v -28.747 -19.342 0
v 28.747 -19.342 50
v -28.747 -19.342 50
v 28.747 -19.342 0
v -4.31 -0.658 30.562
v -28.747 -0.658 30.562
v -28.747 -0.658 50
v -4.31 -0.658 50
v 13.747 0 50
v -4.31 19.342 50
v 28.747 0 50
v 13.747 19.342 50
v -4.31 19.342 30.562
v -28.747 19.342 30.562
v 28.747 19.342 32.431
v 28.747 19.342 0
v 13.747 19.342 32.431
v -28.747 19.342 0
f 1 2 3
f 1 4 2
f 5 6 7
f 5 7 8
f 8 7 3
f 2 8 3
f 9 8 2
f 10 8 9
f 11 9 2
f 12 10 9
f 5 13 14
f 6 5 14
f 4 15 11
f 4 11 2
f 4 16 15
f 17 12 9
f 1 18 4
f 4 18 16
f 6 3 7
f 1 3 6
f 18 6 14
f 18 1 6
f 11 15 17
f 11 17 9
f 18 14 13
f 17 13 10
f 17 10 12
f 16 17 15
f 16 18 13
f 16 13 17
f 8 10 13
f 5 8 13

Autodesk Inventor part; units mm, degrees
ref_plane "YZ Plane" through (0, 0, 0) normal (1, 0, 0) x (0, 1, 0)
ref_plane "XZ Plane" through (0, 0, 0) normal (0, 1, 0) x (-1, 0, 0)
ref_plane "XY Plane" through (0, 0, 0) normal (0, 0, 1) x (1, 0, 0)
sketch "스케치1" plane through (0, 0, 0) normal (0, 0, 1) x (1, 0, 0)
  line L0 (28.7473, -19.3425) -> (-28.7473, -19.3425)
  line L1 (-28.7473, -19.3425) -> (-28.7473, 19.3425)
  line L2 (-28.7473, 19.3425) -> (28.7473, 19.3425)
  line L3 (28.7473, 19.3425) -> (28.7473, -19.3425)
  line L4 (28.7473, -19.3425) -> (-28.7473, 19.3425) construction
  line L5 (-28.7473, -19.3425) -> (28.7473, 19.3425) construction
  point P0 (0, 0)
extrude "돌출1" add sketch "스케치1" along normal blind 50
sketch "스케치2" plane through (-28.7473, 19.3425, 0) normal (0, 1, 0) x (1, 0, 0)
  line L0 (0, -50) -> (57.4945, -50) projected
  line L1 (0, -50) -> (24.4372, -50)
  line L2 (24.4372, -50) -> (24.4372, -30.5624)
  line L3 (24.4372, -30.5624) -> (0, -30.5624)
  line L4 (0, -30.5624) -> (0, -50)
  point P0 (28.7473, 0)
extrude "돌출2" cut sketch "스케치2" against normal blind 20
sketch "스케치3" plane through (28.7473, -19.3425, 0) normal (1, 0, 0) x (0, 0, -1)
  point P0 (0, 19.3425)
sketch "스케치4" plane through (28.7473, -19.3425, 0) normal (1, 0, 0) x (0, 0, -1)
  line L0 (0, 38.685) -> (-50, 38.685) projected
  line L1 (-32.4307, 38.685) -> (-50, 19.3425)
  line L2 (-50, 0) -> (-50, 38.685) projected
  point P0 (0, 19.3425)
extrude "돌출3" cut sketch "스케치4" against normal blind 15
properties part number "240503_3Dsketch05"
